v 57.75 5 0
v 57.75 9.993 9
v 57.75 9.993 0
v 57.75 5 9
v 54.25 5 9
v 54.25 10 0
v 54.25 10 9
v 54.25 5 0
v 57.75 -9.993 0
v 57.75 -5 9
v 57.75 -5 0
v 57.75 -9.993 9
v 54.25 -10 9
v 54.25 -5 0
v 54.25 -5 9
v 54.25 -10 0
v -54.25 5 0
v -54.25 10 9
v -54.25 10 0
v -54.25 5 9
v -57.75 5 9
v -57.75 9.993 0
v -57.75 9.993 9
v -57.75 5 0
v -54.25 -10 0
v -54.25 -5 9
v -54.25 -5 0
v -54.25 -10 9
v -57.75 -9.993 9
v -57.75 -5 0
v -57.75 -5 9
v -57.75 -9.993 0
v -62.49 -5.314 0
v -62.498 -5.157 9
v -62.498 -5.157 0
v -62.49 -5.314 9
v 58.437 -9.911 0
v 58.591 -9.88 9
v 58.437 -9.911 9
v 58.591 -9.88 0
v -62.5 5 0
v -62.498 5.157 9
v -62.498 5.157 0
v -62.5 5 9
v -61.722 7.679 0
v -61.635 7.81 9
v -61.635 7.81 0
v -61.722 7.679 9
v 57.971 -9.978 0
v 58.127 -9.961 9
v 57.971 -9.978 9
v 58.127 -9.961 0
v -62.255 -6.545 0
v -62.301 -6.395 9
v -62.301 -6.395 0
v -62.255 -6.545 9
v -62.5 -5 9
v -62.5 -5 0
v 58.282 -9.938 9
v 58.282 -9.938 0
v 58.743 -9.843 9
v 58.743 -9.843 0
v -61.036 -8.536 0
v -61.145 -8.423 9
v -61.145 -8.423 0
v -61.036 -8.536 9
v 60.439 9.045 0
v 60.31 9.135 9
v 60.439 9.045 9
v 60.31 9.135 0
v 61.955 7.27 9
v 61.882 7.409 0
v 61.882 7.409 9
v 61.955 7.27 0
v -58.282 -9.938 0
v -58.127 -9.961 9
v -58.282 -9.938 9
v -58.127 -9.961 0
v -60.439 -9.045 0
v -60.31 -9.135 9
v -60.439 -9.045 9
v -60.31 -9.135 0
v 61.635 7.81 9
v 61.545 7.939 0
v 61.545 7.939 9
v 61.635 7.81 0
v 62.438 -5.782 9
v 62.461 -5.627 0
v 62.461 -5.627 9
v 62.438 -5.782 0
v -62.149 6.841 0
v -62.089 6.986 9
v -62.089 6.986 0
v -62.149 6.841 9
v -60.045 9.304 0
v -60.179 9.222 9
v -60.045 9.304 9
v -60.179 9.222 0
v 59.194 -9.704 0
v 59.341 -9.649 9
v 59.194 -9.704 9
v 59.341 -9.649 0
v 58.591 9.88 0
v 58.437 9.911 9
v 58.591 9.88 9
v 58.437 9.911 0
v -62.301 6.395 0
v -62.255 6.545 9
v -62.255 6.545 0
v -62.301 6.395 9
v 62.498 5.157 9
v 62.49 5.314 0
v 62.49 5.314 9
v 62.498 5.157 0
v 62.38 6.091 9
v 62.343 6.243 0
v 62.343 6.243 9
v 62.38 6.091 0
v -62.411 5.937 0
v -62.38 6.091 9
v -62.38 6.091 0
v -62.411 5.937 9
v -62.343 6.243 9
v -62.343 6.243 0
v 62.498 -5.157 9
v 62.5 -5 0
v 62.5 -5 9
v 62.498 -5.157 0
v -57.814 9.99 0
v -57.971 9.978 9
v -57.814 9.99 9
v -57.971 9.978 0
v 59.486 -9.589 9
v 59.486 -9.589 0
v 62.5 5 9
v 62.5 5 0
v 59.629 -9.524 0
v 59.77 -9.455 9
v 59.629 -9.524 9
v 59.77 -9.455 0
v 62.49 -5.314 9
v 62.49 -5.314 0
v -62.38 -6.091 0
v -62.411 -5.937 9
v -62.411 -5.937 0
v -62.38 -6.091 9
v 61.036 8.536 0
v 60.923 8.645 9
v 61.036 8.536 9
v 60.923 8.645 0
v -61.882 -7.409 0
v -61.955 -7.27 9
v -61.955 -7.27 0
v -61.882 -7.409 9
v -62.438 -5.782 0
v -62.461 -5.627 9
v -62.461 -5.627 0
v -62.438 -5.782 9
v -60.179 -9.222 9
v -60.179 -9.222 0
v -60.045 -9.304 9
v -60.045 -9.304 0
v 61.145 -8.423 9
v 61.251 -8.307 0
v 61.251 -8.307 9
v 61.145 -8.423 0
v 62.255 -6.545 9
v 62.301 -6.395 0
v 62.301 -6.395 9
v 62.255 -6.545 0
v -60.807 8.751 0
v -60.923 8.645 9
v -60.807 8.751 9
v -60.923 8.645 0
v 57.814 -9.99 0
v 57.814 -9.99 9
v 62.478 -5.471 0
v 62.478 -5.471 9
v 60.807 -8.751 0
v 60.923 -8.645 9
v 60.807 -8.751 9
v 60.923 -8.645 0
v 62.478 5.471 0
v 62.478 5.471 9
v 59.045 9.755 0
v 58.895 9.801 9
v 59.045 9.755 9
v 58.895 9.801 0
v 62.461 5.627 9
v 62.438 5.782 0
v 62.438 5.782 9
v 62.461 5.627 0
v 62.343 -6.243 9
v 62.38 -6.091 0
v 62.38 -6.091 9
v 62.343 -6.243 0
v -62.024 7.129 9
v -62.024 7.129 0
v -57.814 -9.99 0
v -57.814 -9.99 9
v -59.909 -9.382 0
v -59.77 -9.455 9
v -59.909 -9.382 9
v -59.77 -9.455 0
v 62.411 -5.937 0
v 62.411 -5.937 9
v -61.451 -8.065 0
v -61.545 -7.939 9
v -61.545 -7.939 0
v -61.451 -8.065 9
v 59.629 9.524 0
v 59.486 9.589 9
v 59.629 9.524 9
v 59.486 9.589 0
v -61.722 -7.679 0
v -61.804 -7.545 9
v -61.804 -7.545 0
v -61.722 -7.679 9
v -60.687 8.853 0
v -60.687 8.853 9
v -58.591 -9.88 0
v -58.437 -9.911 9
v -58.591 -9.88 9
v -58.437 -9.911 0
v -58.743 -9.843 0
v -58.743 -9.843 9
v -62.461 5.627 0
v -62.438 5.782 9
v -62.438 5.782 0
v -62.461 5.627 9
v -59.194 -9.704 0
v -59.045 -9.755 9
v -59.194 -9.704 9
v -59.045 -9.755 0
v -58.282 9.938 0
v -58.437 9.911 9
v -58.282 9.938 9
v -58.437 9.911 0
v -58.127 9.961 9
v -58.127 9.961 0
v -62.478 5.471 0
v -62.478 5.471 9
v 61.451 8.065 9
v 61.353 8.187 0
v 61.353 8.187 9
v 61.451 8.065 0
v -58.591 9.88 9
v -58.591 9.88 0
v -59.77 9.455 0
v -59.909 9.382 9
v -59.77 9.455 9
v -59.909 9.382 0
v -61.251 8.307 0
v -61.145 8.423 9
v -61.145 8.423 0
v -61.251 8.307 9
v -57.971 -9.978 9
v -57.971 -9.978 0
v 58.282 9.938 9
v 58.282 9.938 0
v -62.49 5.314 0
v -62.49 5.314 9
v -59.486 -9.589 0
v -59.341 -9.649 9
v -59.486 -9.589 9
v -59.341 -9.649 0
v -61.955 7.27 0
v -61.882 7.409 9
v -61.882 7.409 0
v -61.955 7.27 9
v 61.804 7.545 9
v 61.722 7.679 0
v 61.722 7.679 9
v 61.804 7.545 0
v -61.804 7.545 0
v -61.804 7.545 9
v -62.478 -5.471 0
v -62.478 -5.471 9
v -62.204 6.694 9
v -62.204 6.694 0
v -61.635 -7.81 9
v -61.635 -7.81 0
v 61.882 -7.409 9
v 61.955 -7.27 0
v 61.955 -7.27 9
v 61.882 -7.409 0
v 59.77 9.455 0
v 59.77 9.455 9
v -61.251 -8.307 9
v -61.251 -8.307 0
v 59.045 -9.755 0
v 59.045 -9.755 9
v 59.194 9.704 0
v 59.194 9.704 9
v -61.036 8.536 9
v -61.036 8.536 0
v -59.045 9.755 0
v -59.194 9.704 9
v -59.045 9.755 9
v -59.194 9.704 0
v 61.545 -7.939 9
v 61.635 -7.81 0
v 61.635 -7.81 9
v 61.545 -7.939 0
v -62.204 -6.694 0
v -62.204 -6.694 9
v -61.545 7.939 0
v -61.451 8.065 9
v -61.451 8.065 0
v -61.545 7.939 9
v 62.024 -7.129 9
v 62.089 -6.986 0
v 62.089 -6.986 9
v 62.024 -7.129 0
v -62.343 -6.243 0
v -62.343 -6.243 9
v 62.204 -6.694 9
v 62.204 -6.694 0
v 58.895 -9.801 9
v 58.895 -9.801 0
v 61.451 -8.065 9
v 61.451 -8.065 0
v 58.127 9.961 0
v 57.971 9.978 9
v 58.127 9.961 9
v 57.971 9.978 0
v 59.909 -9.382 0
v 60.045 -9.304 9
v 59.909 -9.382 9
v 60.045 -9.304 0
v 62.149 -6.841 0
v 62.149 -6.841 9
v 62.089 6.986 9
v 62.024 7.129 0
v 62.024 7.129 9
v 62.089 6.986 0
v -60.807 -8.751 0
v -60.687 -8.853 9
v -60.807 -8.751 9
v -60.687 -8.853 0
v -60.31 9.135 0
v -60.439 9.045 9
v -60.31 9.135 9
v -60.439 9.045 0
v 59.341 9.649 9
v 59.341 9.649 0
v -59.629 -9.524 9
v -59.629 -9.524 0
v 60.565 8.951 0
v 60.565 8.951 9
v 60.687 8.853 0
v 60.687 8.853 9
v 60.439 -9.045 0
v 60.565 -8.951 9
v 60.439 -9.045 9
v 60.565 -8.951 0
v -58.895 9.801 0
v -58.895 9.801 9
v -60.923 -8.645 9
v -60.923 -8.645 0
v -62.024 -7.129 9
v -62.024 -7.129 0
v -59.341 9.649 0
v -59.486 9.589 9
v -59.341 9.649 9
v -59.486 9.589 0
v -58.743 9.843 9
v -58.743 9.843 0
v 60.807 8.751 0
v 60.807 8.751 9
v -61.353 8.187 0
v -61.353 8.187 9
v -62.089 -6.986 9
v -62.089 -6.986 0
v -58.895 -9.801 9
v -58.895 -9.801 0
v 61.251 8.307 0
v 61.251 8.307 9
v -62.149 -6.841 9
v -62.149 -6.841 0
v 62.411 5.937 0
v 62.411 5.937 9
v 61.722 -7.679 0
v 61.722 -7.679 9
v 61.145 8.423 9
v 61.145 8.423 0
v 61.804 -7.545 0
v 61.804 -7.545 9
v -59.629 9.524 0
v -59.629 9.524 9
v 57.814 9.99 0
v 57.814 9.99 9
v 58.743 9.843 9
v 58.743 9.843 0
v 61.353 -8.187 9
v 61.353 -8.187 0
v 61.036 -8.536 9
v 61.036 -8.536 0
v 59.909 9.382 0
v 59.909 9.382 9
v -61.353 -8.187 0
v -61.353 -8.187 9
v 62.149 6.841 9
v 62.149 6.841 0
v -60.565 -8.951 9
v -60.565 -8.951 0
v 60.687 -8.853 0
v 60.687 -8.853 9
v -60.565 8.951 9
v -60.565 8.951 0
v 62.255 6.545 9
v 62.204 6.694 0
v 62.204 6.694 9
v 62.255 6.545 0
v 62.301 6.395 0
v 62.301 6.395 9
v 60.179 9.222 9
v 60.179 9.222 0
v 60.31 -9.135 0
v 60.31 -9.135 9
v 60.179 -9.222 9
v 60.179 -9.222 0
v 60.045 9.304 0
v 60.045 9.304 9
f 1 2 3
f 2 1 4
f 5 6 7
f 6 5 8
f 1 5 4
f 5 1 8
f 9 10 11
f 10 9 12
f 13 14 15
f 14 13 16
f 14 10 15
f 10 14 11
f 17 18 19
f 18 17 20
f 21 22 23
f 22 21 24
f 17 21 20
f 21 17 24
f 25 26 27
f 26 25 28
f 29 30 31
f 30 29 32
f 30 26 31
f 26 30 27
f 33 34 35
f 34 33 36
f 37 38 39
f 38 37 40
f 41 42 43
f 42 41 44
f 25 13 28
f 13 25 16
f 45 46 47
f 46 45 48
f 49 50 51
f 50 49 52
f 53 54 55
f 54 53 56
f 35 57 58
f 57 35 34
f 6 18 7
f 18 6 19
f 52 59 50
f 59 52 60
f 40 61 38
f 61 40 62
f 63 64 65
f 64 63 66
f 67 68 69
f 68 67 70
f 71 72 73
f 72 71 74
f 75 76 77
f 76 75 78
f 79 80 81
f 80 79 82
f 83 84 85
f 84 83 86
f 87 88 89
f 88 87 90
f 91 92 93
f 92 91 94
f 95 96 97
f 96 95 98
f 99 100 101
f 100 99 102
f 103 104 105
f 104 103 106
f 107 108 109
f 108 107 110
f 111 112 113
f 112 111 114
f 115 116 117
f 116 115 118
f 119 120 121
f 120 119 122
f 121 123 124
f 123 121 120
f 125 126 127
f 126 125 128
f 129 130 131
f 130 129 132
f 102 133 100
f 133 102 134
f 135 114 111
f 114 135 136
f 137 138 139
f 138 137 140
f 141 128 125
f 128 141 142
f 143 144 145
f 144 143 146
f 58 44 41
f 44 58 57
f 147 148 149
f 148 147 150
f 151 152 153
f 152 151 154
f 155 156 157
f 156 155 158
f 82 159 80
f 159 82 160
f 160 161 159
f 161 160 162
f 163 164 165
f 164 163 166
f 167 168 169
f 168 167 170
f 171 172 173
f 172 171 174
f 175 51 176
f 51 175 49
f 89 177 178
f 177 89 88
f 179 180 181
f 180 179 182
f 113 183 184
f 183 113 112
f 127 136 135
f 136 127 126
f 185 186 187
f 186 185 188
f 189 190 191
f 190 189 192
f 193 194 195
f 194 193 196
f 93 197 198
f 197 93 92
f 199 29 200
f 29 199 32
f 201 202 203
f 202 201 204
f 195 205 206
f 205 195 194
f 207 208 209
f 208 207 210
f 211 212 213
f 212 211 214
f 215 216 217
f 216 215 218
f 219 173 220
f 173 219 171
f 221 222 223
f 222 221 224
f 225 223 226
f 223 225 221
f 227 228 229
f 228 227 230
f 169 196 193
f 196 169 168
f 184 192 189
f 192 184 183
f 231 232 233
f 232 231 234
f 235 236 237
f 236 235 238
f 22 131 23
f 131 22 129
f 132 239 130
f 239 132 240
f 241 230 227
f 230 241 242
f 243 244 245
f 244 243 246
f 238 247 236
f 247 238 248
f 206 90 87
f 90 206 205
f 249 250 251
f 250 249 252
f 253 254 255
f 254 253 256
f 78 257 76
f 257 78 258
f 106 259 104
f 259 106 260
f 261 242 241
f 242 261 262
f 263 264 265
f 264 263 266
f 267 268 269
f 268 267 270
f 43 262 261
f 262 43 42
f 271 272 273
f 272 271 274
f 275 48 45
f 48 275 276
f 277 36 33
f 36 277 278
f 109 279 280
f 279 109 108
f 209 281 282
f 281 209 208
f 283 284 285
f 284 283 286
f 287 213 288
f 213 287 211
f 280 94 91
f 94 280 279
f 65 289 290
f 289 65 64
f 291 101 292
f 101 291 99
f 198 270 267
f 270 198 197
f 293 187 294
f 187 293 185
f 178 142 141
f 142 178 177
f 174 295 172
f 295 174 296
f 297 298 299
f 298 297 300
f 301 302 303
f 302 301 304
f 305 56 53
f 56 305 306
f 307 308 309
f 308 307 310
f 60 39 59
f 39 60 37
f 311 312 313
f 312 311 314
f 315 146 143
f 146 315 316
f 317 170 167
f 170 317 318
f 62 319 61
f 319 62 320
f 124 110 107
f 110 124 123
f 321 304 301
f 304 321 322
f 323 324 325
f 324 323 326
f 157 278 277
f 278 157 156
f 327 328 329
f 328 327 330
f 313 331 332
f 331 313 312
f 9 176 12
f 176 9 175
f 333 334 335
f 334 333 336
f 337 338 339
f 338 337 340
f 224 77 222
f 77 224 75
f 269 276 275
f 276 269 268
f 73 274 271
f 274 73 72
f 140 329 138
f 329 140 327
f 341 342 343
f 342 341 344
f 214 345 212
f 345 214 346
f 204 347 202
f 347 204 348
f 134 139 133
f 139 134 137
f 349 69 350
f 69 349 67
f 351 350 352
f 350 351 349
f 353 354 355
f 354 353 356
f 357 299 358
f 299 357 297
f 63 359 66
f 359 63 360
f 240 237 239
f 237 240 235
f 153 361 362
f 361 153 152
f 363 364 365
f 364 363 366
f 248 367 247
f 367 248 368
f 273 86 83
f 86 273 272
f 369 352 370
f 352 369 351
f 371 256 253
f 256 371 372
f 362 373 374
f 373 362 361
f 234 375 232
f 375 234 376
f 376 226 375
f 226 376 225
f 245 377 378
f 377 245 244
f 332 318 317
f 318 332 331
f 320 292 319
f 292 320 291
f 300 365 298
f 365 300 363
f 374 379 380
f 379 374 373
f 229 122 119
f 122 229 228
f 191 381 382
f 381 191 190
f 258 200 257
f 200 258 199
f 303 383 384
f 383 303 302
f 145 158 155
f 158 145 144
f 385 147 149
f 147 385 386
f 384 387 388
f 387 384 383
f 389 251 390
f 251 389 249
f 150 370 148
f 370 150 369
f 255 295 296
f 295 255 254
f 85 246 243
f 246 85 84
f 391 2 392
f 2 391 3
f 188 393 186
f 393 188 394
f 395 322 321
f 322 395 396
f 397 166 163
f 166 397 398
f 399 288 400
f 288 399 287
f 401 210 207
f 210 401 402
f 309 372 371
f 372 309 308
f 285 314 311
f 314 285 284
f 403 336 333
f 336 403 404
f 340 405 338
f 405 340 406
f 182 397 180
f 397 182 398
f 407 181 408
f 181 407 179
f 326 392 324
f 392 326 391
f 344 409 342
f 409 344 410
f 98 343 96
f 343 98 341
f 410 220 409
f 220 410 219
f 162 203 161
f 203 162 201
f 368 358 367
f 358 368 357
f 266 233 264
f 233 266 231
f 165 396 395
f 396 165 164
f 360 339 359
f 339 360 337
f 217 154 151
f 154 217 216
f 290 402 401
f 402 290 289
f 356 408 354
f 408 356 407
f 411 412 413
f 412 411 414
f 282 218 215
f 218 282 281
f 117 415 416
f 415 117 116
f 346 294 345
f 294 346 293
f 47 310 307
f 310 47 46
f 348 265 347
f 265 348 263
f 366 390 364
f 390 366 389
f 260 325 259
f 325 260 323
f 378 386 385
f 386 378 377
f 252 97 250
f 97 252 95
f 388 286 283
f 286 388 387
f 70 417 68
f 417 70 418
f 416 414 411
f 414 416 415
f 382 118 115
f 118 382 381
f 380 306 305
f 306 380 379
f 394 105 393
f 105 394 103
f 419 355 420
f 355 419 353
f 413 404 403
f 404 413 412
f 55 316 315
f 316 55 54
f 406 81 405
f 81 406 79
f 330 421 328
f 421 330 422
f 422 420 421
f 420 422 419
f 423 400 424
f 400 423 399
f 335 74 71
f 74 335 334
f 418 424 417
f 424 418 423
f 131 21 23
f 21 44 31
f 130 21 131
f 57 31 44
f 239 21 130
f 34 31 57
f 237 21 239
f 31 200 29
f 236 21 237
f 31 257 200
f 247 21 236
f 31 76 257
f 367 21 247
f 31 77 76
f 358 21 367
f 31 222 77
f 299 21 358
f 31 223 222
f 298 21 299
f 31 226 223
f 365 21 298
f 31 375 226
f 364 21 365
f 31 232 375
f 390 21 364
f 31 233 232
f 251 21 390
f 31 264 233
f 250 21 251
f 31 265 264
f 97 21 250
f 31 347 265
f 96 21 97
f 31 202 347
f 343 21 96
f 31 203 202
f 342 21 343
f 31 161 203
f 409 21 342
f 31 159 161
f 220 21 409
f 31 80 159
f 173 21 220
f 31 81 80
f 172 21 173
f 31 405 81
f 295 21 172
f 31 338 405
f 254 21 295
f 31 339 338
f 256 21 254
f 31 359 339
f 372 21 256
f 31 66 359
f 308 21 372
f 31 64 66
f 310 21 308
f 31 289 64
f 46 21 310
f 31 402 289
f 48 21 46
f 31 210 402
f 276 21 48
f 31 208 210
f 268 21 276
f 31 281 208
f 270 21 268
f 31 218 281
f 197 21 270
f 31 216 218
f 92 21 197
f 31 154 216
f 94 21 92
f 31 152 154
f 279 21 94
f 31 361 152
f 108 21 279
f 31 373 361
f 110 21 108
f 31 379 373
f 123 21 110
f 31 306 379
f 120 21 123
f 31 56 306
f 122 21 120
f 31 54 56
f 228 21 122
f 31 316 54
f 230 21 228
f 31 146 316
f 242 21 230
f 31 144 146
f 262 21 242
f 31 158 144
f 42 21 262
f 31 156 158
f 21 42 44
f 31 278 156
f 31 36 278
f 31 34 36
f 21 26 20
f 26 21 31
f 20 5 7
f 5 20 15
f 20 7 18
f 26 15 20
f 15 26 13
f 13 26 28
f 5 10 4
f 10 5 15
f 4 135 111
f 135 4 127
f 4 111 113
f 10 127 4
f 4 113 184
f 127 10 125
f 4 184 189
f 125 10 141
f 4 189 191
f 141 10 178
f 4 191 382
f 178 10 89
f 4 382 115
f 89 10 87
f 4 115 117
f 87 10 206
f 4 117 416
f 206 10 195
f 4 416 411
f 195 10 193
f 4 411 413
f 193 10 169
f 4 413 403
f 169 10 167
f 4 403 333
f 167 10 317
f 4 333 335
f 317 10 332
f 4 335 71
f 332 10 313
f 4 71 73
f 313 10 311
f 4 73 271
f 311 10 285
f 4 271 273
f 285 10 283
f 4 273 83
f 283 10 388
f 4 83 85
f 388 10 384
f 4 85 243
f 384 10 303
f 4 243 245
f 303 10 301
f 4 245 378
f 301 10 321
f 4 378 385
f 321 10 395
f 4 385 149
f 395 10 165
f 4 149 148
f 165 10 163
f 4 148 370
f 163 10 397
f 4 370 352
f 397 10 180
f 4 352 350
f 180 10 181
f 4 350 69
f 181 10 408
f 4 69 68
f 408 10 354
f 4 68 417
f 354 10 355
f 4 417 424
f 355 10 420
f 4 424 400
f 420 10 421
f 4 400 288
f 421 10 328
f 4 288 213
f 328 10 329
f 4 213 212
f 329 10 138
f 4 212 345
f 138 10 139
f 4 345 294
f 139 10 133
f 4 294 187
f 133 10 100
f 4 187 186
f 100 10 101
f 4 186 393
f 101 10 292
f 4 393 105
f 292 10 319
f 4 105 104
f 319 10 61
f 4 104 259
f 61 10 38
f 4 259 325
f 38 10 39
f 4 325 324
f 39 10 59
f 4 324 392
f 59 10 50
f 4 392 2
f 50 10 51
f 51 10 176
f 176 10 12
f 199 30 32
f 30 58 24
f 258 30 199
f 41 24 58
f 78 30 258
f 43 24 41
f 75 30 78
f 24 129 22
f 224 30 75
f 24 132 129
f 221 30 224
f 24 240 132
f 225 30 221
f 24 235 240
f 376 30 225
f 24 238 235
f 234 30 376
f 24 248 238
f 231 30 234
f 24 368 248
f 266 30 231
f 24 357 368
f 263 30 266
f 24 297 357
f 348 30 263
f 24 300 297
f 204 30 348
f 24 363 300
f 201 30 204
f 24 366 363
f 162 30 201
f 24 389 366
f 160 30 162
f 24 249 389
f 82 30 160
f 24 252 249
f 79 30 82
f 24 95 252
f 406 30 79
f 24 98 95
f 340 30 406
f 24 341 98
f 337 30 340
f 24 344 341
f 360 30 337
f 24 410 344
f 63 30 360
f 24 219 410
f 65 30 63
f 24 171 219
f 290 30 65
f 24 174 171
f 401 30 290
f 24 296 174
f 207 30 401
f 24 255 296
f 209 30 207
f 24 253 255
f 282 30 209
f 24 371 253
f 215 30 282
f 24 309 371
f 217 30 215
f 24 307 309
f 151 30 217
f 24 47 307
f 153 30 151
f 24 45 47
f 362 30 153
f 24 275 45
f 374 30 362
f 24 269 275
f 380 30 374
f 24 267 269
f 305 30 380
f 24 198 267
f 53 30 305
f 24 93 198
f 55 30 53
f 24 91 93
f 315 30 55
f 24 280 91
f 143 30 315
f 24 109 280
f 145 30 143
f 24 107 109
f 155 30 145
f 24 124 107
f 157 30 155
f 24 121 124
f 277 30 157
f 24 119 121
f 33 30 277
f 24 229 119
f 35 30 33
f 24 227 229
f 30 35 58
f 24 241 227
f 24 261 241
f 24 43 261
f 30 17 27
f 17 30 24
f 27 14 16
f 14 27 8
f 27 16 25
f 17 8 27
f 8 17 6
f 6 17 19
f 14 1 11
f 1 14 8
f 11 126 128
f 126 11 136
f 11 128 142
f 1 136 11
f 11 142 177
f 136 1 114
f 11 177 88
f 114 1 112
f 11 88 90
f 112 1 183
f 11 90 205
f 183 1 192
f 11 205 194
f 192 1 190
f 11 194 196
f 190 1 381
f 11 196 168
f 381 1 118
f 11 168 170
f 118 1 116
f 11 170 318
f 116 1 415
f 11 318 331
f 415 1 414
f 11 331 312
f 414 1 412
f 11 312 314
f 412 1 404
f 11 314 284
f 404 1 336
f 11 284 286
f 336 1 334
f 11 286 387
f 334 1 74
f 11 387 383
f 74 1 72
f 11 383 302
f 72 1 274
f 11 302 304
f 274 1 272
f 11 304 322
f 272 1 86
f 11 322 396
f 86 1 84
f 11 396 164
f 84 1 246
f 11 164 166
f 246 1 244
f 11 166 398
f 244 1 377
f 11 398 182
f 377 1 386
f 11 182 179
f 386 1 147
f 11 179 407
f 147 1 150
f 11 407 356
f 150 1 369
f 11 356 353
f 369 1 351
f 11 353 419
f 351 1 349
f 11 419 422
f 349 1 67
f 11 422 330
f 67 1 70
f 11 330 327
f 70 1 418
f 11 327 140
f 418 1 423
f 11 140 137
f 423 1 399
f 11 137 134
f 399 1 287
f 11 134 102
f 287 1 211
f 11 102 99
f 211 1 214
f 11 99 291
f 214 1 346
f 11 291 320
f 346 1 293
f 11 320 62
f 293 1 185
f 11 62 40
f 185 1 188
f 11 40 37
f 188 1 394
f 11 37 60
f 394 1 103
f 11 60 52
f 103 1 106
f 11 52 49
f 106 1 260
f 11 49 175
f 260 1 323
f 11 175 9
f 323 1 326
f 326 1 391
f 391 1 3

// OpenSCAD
//
//
//  Connection Stick for Standalone Spool Holder by TouchWARE
//
//  Copyright (C) 2016 TouchWARE, Jan Verner
//
//

spoolwidth=95;         // Enter Spool Width Here (in mm)

module roundedRect(size, radius)
{
        // this function is from Round corners for Openscad - Tutorial by WilliamAAdams
        // http://www.thingiverse.com/thing:9347
    
	x = size[0];
	y = size[1];
	z = size[2];

	linear_extrude(height=z)
	hull()
	{
		translate([(-x/2)+(radius/2), (-y/2)+(radius/2), 0])
		circle(r=radius);
	
		translate([(x/2)-(radius/2), (-y/2)+(radius/2), 0])
		circle(r=radius);
	
		translate([(-x/2)+(radius/2), (y/2)-(radius/2), 0])
		circle(r=radius);
	
		translate([(x/2)-(radius/2), (y/2)-(radius/2), 0])
		circle(r=radius);
	}
}



difference()
{
  roundedRect([spoolwidth+25,15,9],5,$fn=200);
  union()
  {
    translate([spoolwidth/2+6.75,5,-5]) cube([3.5,10,20]);
    translate([spoolwidth/2+6.75,-15,-5]) cube([3.5,10,20]);
    translate([-spoolwidth/2-10.25,5,-5]) cube([3.5,10,20]);
    translate([-spoolwidth/2-10.25,-15,-5]) cube([3.5,10,20]);
  }
        
}
